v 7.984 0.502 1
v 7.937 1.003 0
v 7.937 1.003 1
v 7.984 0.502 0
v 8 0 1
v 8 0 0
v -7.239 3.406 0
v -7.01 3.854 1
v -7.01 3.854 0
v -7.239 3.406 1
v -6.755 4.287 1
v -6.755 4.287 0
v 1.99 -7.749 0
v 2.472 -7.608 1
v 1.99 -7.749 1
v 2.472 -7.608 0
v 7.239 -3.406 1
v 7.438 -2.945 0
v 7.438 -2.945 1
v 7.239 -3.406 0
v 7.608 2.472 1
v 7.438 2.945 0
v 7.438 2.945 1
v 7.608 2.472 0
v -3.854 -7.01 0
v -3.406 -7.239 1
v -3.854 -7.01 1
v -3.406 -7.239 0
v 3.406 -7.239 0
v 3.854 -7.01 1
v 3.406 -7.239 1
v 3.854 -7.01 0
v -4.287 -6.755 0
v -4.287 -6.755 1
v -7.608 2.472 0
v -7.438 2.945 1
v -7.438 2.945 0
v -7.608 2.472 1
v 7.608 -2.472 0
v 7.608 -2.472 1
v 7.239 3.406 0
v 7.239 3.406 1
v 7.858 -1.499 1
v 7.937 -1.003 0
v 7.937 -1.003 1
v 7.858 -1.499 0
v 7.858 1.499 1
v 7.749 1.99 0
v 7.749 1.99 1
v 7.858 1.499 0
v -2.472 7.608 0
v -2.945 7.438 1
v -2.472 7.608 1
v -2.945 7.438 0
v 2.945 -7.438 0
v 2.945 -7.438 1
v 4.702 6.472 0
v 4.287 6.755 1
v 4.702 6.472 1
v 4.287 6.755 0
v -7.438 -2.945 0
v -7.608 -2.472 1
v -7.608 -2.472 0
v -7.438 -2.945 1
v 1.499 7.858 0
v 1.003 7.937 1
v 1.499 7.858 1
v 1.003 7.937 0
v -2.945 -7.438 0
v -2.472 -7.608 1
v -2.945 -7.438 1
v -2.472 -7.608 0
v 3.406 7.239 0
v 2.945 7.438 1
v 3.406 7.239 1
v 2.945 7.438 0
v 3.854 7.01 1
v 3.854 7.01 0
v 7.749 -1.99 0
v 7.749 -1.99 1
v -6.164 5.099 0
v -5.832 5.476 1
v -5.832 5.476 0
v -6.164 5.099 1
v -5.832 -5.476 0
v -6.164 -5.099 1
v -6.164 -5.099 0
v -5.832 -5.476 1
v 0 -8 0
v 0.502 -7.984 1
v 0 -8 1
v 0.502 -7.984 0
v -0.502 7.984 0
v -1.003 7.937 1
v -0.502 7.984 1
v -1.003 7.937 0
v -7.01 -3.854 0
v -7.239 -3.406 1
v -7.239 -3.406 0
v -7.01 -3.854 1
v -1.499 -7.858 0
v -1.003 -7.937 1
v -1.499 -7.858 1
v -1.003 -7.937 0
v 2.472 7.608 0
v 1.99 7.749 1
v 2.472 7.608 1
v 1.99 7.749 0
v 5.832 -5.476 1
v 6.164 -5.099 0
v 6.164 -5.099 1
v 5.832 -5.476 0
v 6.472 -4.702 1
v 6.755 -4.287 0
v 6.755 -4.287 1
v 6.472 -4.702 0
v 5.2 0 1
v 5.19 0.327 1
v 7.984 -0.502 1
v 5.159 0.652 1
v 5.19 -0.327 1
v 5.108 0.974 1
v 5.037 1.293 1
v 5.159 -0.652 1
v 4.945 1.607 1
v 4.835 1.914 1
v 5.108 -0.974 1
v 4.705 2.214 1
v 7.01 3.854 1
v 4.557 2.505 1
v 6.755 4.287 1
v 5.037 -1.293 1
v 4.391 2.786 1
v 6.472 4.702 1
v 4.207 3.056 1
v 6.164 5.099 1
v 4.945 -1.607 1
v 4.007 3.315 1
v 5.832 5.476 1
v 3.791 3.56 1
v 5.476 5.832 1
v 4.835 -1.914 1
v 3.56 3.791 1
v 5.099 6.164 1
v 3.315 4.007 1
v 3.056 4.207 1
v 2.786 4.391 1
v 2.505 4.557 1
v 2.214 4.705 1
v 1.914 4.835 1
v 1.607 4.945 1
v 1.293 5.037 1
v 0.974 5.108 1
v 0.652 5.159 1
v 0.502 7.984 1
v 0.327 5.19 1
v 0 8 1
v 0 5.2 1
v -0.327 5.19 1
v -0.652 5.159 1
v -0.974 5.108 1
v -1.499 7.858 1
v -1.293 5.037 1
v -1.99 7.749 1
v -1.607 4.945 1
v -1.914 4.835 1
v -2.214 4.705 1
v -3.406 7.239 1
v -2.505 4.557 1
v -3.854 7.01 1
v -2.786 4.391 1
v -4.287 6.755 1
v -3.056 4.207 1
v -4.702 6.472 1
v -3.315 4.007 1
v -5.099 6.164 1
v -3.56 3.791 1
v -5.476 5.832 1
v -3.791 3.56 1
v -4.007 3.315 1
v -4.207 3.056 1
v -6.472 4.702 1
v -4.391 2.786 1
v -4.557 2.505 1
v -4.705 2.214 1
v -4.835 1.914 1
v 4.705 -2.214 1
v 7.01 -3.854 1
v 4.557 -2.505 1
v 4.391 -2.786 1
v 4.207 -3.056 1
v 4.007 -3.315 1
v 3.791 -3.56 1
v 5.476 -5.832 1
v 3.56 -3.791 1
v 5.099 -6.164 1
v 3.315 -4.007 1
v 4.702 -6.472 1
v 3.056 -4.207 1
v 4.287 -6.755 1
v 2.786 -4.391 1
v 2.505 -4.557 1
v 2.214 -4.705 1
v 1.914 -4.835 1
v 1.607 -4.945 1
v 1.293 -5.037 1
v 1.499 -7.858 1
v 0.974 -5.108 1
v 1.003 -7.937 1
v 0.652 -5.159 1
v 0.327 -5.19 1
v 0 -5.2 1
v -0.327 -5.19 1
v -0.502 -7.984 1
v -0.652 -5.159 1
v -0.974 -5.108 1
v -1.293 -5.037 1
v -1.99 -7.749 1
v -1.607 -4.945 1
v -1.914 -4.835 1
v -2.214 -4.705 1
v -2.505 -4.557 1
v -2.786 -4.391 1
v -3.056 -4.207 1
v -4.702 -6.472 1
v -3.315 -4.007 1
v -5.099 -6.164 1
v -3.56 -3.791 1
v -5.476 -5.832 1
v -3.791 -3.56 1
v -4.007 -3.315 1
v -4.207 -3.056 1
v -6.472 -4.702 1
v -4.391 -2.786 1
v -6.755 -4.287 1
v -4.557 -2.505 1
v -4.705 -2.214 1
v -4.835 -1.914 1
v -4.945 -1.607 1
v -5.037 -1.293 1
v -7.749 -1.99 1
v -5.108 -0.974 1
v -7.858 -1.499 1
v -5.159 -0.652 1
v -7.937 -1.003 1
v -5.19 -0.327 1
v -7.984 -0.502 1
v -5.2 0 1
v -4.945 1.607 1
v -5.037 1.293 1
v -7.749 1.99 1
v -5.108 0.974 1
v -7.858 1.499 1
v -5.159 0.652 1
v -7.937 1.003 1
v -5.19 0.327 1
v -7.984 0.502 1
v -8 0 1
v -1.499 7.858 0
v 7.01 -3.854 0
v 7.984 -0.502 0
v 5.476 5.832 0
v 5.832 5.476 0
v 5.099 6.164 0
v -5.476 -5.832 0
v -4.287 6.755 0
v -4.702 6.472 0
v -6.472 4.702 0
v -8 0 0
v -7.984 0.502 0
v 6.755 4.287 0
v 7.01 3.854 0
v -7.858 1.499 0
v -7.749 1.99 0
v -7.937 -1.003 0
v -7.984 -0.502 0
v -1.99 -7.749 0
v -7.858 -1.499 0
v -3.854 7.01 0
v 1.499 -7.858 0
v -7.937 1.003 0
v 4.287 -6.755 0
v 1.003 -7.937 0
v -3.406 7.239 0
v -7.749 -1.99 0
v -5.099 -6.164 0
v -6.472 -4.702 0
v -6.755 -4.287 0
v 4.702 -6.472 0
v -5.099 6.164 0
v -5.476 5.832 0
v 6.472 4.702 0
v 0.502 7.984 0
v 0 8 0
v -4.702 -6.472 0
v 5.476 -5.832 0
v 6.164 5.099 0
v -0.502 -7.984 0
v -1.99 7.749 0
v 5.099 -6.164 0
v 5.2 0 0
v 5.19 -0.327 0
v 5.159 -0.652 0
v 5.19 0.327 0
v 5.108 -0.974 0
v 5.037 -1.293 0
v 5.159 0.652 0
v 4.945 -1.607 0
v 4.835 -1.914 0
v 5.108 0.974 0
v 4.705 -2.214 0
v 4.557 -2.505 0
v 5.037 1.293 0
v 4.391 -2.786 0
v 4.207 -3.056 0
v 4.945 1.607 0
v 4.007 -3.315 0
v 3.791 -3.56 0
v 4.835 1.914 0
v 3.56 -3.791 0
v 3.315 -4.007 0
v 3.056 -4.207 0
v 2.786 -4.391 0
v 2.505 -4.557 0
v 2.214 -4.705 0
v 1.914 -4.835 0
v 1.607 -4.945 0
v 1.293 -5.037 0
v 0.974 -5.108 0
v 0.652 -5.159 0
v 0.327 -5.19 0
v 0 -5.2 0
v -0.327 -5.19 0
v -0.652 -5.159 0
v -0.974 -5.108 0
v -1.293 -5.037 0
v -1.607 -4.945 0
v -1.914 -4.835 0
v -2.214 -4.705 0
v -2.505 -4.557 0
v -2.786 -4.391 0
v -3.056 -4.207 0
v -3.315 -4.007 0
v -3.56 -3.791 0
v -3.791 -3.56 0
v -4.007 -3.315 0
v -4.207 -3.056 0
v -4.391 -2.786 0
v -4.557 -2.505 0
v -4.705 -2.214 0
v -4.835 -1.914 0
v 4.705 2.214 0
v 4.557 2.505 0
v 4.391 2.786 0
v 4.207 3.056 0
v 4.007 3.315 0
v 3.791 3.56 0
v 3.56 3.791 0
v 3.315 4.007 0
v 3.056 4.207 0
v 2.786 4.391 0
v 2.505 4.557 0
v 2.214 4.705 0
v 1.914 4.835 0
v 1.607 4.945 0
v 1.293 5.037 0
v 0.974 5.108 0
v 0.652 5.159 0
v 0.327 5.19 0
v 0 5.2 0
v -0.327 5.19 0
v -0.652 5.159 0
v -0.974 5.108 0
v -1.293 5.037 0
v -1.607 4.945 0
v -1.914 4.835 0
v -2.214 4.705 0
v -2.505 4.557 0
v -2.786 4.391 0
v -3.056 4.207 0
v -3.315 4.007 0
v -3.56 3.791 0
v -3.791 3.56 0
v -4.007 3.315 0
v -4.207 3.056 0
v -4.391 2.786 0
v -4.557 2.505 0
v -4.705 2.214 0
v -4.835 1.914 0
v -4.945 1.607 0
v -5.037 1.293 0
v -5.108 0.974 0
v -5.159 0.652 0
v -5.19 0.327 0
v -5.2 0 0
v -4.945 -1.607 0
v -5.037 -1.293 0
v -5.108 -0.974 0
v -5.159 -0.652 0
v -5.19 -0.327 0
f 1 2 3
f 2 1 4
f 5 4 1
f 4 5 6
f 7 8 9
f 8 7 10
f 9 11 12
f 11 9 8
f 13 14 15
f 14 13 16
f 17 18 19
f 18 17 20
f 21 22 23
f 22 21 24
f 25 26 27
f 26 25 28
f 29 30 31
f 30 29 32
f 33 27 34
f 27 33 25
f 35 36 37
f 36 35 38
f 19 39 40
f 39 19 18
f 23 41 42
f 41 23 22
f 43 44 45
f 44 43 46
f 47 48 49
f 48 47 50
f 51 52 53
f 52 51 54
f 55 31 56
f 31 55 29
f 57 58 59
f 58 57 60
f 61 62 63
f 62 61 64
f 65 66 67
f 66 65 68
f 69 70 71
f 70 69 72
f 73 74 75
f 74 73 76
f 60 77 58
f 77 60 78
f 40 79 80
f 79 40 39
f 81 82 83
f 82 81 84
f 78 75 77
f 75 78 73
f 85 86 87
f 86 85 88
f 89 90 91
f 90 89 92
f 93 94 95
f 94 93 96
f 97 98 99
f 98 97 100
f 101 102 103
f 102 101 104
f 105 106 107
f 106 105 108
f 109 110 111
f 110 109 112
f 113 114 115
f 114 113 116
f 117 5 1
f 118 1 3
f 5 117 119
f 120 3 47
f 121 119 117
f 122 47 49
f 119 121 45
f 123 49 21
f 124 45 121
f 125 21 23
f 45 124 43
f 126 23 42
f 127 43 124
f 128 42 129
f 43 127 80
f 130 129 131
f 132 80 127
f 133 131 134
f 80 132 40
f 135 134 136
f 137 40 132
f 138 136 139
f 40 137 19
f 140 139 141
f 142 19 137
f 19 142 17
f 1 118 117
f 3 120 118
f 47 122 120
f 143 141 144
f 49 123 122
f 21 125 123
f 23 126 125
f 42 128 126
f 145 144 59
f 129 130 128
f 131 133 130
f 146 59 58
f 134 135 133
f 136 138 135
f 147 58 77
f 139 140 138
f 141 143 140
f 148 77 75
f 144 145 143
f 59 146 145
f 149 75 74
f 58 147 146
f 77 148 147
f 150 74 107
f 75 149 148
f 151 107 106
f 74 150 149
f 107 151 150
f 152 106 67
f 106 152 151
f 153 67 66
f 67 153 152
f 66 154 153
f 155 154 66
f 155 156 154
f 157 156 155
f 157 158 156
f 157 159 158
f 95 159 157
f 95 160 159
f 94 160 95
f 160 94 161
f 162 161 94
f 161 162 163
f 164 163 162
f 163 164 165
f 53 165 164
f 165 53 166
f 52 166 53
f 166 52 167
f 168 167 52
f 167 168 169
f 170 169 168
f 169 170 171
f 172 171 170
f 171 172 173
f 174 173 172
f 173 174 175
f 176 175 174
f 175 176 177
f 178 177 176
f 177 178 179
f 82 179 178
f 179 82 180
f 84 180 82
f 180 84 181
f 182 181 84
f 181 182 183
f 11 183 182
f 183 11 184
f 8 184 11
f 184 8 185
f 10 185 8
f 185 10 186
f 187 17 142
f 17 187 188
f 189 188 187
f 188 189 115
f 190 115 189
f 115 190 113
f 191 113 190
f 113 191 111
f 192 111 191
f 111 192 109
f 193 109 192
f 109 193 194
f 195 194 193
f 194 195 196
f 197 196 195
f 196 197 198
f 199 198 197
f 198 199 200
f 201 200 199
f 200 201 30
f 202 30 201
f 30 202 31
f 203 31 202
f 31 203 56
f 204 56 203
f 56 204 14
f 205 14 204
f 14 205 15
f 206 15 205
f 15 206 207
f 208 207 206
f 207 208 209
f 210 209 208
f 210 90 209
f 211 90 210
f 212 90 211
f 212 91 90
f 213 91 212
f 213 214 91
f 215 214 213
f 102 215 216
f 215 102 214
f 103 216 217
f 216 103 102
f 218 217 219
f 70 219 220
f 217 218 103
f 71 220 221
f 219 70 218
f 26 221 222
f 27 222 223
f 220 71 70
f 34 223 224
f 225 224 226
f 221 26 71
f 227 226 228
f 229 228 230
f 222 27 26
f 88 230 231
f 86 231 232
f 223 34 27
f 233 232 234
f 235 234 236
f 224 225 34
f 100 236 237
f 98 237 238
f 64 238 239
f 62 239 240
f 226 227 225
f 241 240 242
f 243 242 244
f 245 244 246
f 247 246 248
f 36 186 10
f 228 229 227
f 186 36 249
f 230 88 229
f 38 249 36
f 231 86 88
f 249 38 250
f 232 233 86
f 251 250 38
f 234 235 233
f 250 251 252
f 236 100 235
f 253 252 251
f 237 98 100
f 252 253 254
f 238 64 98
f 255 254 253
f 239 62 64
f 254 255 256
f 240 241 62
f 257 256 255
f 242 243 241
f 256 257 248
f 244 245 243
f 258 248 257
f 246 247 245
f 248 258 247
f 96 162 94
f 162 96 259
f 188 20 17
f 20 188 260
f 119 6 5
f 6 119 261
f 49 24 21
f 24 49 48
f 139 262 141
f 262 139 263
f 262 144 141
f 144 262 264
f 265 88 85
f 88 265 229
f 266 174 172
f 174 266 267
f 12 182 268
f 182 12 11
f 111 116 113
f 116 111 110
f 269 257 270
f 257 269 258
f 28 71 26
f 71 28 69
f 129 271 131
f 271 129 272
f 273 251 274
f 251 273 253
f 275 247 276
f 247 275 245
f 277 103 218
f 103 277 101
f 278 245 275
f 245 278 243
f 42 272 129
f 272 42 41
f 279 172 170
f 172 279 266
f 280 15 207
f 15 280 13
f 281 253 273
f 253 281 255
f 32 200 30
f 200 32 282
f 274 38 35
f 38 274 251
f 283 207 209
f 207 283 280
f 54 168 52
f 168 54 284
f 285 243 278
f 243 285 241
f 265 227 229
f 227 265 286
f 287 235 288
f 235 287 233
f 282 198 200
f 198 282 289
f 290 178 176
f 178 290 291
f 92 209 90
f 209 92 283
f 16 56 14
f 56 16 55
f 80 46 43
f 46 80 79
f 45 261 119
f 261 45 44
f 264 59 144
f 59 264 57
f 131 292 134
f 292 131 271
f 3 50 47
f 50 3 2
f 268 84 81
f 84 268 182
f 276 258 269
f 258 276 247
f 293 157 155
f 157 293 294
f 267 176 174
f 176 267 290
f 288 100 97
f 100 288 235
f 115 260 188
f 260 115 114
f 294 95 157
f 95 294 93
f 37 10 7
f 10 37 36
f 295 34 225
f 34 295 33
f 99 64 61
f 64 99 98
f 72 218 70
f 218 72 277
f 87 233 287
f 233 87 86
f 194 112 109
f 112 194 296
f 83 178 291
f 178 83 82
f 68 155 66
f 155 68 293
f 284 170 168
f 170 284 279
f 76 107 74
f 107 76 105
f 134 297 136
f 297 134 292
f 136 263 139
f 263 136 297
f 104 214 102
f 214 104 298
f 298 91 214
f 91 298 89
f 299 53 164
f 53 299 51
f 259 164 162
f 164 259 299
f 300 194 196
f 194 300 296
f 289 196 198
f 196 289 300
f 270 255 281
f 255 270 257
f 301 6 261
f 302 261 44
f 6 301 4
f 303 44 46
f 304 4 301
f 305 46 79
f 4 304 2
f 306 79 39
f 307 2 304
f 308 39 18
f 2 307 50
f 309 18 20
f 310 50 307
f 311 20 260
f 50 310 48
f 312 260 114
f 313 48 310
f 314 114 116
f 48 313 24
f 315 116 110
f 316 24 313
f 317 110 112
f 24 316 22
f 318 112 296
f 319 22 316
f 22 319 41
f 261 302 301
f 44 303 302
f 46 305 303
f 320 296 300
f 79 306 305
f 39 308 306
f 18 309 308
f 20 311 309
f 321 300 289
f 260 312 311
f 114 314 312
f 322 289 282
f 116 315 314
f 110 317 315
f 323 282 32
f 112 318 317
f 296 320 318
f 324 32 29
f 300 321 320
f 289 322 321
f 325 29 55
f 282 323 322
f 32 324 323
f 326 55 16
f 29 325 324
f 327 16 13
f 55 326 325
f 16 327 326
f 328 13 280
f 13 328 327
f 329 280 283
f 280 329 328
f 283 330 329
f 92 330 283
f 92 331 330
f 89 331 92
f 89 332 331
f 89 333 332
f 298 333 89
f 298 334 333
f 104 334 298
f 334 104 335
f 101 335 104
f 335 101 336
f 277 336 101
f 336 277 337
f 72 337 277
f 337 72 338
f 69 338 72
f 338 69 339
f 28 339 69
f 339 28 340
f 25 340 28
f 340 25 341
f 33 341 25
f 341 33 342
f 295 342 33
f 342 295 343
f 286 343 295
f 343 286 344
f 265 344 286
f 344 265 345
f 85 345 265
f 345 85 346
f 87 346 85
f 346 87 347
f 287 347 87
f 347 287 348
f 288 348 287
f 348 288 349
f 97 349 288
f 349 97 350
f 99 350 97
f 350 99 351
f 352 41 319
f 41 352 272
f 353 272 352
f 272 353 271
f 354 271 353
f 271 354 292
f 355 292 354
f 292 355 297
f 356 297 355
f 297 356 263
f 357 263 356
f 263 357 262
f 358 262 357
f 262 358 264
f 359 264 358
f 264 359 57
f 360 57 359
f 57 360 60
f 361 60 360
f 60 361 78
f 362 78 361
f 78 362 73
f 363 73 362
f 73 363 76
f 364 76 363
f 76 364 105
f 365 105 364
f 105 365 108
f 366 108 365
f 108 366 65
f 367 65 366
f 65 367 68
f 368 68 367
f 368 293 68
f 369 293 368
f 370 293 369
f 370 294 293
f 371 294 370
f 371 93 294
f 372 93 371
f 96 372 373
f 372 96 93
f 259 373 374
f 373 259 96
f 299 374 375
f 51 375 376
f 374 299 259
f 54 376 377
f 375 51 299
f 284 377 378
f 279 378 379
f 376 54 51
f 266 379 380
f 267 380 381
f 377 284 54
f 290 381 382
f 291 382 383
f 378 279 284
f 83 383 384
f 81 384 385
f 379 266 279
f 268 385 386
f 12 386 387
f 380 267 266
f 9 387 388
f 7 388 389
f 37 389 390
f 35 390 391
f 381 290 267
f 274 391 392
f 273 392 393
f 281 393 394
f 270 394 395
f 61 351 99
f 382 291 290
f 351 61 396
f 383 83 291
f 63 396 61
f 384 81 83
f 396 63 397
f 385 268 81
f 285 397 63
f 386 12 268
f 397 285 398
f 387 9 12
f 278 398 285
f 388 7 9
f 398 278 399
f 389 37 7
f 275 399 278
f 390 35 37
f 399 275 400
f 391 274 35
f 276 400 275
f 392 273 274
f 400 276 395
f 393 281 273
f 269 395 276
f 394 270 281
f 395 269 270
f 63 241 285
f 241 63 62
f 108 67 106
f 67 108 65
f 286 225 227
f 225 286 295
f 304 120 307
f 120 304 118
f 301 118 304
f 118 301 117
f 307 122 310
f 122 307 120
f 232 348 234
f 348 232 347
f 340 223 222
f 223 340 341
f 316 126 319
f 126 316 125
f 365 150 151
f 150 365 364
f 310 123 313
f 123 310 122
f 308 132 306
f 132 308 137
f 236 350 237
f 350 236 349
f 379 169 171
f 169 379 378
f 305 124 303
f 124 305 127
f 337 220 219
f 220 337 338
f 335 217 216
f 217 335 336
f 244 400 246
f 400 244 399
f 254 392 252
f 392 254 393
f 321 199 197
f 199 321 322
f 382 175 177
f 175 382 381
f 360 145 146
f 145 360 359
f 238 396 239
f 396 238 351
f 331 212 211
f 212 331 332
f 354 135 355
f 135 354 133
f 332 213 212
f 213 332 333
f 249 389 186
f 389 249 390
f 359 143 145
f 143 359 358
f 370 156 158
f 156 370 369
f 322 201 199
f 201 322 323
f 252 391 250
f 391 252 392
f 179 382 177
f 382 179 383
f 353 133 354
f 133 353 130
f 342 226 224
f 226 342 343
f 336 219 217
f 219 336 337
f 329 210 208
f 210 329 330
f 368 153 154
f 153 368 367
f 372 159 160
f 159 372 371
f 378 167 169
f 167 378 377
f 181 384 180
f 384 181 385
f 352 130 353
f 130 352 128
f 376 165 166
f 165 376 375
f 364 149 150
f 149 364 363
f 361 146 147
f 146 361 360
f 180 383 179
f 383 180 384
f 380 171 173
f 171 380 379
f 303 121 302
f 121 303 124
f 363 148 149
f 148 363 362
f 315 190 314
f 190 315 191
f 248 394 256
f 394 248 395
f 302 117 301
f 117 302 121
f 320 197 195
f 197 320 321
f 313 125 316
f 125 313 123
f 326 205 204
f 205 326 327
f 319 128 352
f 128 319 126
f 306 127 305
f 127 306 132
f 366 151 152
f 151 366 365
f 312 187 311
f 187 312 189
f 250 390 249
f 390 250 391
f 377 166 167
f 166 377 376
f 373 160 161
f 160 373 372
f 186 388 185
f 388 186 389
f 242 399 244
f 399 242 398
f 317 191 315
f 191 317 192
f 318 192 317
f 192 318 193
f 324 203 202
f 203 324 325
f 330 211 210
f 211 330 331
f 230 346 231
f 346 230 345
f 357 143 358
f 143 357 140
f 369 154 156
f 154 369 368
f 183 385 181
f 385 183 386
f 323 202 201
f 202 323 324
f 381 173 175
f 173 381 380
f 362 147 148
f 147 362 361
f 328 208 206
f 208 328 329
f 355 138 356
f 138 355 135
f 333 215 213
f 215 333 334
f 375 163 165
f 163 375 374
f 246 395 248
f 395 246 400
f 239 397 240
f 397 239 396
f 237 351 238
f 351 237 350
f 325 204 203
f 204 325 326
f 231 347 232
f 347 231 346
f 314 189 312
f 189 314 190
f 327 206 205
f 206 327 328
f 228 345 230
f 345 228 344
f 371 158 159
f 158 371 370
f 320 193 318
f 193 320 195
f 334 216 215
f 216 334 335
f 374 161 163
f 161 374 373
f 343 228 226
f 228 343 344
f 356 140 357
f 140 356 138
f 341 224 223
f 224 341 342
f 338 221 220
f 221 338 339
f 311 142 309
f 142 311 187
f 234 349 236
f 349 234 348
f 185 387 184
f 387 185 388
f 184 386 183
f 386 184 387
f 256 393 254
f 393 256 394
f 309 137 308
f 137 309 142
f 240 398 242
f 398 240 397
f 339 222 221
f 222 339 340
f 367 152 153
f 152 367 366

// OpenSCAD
$fn = 100;
h_main = 12;
h_wall = 3;
screw_depth = 10;
screw_box = 39;
screw_d = 3.0;
screw_offset = 3; 

shaft_d = 4.0;

gearbox_h1=5.5;
gearbox_h2=15;
gearbox_d1=27.2;
gearbox_d2=38.2;

brackets_z_offset=1.5;
brackets_w=screw_box + 2 * 11;

use <MCAD/shapes.scad>

//screw offset
ofst = screw_box/2;
ofsz = h_main-screw_depth;

module screw() {
    translate([0,0,-h_main/2]) cylinder(h = h_main*3, r = screw_d/2);
}

module big_bearing_holder(add_height=2, add_d=0) {
    //bearing holder outer
    translate([0,0,-h_wall-1.5]) 
    cylinder(h=h_wall+add_height, r=(22+h_wall+add_d)/2);
}

module gearbox() {
difference() {
    h_gb = gearbox_h2 + gearbox_h1 + h_wall;
    union() {
        cylinder(h = h_gb, r = 44/2);
        cylinder(h = h_gb+1, r = 41/2);
        translate([0,0,h_gb/2]) roundedBox(width = screw_box, 
            height = screw_box, depth = h_gb, radius = h_wall);
        
        big_bearing_holder();
    }
    
    // gearbox inner wide
    translate([0,0,h_wall+gearbox_h1]) cylinder(h = 50, r = gearbox_d2/2);
    
    // screws & spacers
    screw_holder_space=2.5;
    screw_d_space=screw_d+5.5;
    screw_space = (gearbox_h2 + gearbox_h1) - screw_holder_space*2 - 1;
    translate([ofst-screw_offset,ofst-screw_offset,ofsz]) {
        screw();
        translate([1,1,screw_holder_space]) cylinder(h=screw_space, r=screw_d_space/2);
    }
    translate([ofst-screw_offset,screw_offset-ofst,ofsz]) {
        screw();
        translate([1,-1,screw_holder_space]) cylinder(h=screw_space, r=screw_d_space/2);
    }
    translate([screw_offset-ofst,ofst-screw_offset,ofsz]) {
        screw();
        translate([-1,1,screw_holder_space]) cylinder(h=screw_space, r=screw_d_space/2);
    }
    translate([screw_offset-ofst,screw_offset-ofst,ofsz]) {
        screw();
        translate([-1,-1,screw_holder_space]) cylinder(h=screw_space, r=screw_d_space/2);
    }
    
    
    //bearing
    translate([0,0,-h_wall-0.5]) cylinder(h = 50, r = 22.2/2);
    translate([0,0,-h_wall-3]) cylinder(h = 50, r = 10.2/2);
    
    // gearbox inner container
    translate([0,0,h_wall]) cylinder(h = 50, r = gearbox_d1/2);
    // gearbox connector
    translate([ofst-5/2,-5/2,h_gb]) cube(size = 5);
    translate([0,0,h_gb]) cylinder(h = 5, r = 39.1/2);
    
    //bootom wall difference
    translate([0,0,-0.1]) difference(){
        cylinder(h=brackets_z_offset+0.1,r=32);
        translate([0,0,brackets_z_offset/2]) 
            roundedBox(width = screw_box, height = screw_box, 
            depth = brackets_z_offset+0.1, radius = h_wall);
    }
}
}

//Top box
module topbox(z_offset=-22){
translate([0,0,z_offset]) {
    difference () {
    w = screw_box + 3;
    h = h_wall + h_main + 7;
    union () {
        //top wall
        translate([0,0,h_wall/2]) roundedBox(width = w, 
            height = w, depth = h_wall, radius = h_wall);
        //bottom wall
        translate([0,0,h-h_wall/2-0.75]) 
            roundedBox(width=w, height=w, depth=h_wall+1.5, radius=h_wall);
        //stand1
        //translate([ofst-screw_offset,ofst-screw_offset,h/2]) 
        //roundedBox(width = h_wall*3, 
        //    height = h_wall*3, depth = h, radius = h_wall);
        //wall1
        translate([ofst-screw_offset,0,h/2]) 
        roundedBox(width = h_wall*3, 
            height = w, depth = h, radius = h_wall);
        //wall2
        translate([screw_offset-ofst,0,h/2]) 
        roundedBox(width = h_wall*3, 
            height = w, depth = h, radius = h_wall);
        
        //bearing_h
        translate([0,0,-3.5]) cylinder(h = 5, r = 12);
        
        mirror([0,0,-1]) translate([0,0,z_offset]) brackets();
    }
    
    //srews
    translate([ofst-screw_offset,ofst-screw_offset,ofsz]) screw();
    translate([ofst-screw_offset,screw_offset-ofst,ofsz]) screw();
    translate([screw_offset-ofst,ofst-screw_offset,ofsz]) screw();
    translate([screw_offset-ofst,screw_offset-ofst,ofsz]) screw();
    
    // screw space
    outer_d=24; inner_d=15;
    screw_space=h - h_wall*2 - 1.5;
    translate([outer_d,0,h_wall]) difference() {
        cylinder(h=screw_space,r=outer_d);
        cylinder(h=screw_space,r=inner_d);
    }
    
    // inner circle
    translate ([0,0,h_wall+0.01]) difference() {
        cylinder(h = h-h_wall*2-1.5, r = 18);
        translate([outer_d,0,0]) cube([outer_d+5,50,h*2], center = true);
    }
    translate([0,0,-z_offset-h_main-2.5]) big_bearing_holder(17.5, 1);
    
    //top bearing
    translate([0,0,-2.5]) cylinder(h = 10, r = 13.2/2);
    translate([0,0,-5]) cylinder(h = 10, r = 8/2);
    
    //bootom wall difference
    translate([0,0,-z_offset-brackets_z_offset]) difference(){
        cylinder(h=brackets_z_offset+0.1,r=32);
        translate([0,0,brackets_z_offset/2]) 
            roundedBox(width = screw_box, height = screw_box, 
            depth = brackets_z_offset+0.1, radius = h_wall);
    }
    
    //asd
    translate([0,0,-z_offset]) cube([10,100,10], center=true);
    
    }
}
}

module shaft(distance = -18){
translate([0,0,distance]) difference() {
    hole_d = 12;
    h = 21;
    h2 = 6.5;
    union (){
        cylinder(h = h, r = 10/2-0.2);
        
        rh=9;
        ds=1.2;
        cylinder(h = 13, r = rh);
        
        fnn=25; sh=0.4; offs=0.5;
        cylinder(h=offs,r=rh+ds*3,$fn=fnn);
        translate ([0,0,offs]) cylinder(h=0.5,r=rh+ds*3,$fn=fnn);
        translate ([0,0,offs+0.5]) cylinder(h=0.5,r=rh+ds*2,$fn=fnn);
        translate ([0,0,offs+1]) cylinder(h=0.5,r=rh+ds,$fn=fnn);
        
        offs2=offs+1.5+2;
        translate ([0,0,offs2]) cylinder(h=sh,r=rh+ds,$fn=fnn);
        translate ([0,0,offs2+sh]) cylinder(h=sh,r=rh+ds*2,$fn=fnn);
        translate ([0,0,offs2+sh*2]) cylinder(h=sh,r=rh+ds*2,$fn=fnn);
        translate ([0,0,offs2+sh*3]) cylinder(h=sh,r=rh+ds,$fn=fnn);
        
        offs3=offs2+4;
        translate ([0,0,offs3]) cylinder(h=sh,r=rh+ds,$fn=fnn);
        translate ([0,0,offs3+sh]) cylinder(h=sh,r=rh+ds*2,$fn=fnn);
        translate ([0,0,offs3+sh*2]) cylinder(h=sh,r=rh+ds*2,$fn=fnn);
        translate ([0,0,offs3+sh*3]) cylinder(h=sh,r=rh+ds,$fn=fnn);

        offs4=offs3+4;
        translate ([0,0,offs4]) cylinder(h=0.5,r=rh+ds,$fn=fnn);
        translate ([0,0,offs4+0.5]) cylinder(h=0.5,r=rh+ds*2,$fn=fnn);
        translate ([0,0,offs4+1]) cylinder(h=0.5,r=rh+ds*3,$fn=fnn);
        
        //belt dbg
        //%translate ([0,0,0.5]) cylinder(h=12,r=13);
        
        translate([0,0,h]) intersection() {
            cylinder(h = h2, r = 7.9/2);
            cube([5.9,8,h2*2], center = true);
        }
    }
    
    translate([0,0,-5]) cylinder(h = 40, r = shaft_d/2);
}
}

module brackets() translate([0,0,brackets_z_offset]) {
color("olive") difference() {
    union() {
        translate([0,ofst-screw_offset,h_wall/2])
         roundedBox(width = brackets_w, 
         height = h_wall*3, depth = h_wall, radius = h_wall);
        translate([0,screw_offset-ofst,h_wall/2])
         roundedBox(width = brackets_w, 
         height = h_wall*3, depth = h_wall, radius = h_wall);
    }
    
    //inner srews
    translate([ofst-screw_offset,ofst-screw_offset,ofsz]) screw();
    translate([ofst-screw_offset,screw_offset-ofst,ofsz]) screw();
    translate([screw_offset-ofst,ofst-screw_offset,ofsz]) screw();
    translate([screw_offset-ofst,screw_offset-ofst,ofsz]) screw();
    
    //outer srews
    ofstb=brackets_w/2-screw_offset/2;
    translate([ofstb-screw_offset,ofst-screw_offset,ofsz]) screw();
    translate([ofstb-screw_offset,screw_offset-ofst,ofsz]) screw();
    translate([screw_offset-ofstb,ofst-screw_offset,ofsz]) screw();
    translate([screw_offset-ofstb,screw_offset-ofst,ofsz]) screw();
    
    //inner circle
    translate([0,0,-0.5]) cylinder(h=h_wall+1,r=screw_box/2);
}
}

module hwall(h_gb, w, h, offset) {
    translate([screw_box-0.15,0,10.72])
    rotate(a=60, v=[0,-1,0])
    cube([h_gb,w,h], center = true);
    
    translate([h_gb*2-h_wall-2,0,h_gb-h_wall*1.5])
    roundedBox(width=h_wall*4,height=w,//screw_box+offset*1.5,
    depth=h,radius=h_wall);
}       
module holder() {
    offset=6;
    h=brackets_z_offset*2;
    w=screw_box+offset*1.5+h_wall+1;
    difference() {
        union() {
            cube([brackets_w+offset,w,h], center = true);
            
            h_gb = gearbox_h2 + gearbox_h1 + h_wall*2;
            hwall(h_gb, w, h, offset);
            mirror([1,0,0]) hwall(h_gb, w, h, offset);
            
            dx=24.5;
            dy=h_gb/2 - h_wall + 0.75;
            translate([0,dx,dy]) 
            cube([brackets_w*1.5+1,h_wall,h_gb-1.5], center=true);
            translate([0,-dx,dy]) 
            cube([brackets_w*1.5+1,h_wall,h_gb-1.5], center=true);
        }

    
        //outer srews
        ofstb=brackets_w/2-screw_offset/2;
        translate([ofstb-screw_offset,ofst-screw_offset,ofsz]) screw();
        translate([ofstb-screw_offset,screw_offset-ofst,ofsz]) screw();
        translate([screw_offset-ofstb,ofst-screw_offset,ofsz]) screw();
        translate([screw_offset-ofstb,screw_offset-ofst,ofsz]) screw();
        
        //wall difference
        translate([45,0.25,3.8]) rotate(a=60, v=[0,-1,0])
        cube([30,w+1,14.5], center = true);
        mirror([1,0,0])
        translate([45,0.25,3.8]) rotate(a=60, v=[0,-1,0])
        cube([30,w+1,14.4], center = true);
        
        //screws
        dx=w-3;
        dy=ofst+1;
        translate([dx,dy,0]) screw();
        translate([dx,-dy,0]) screw();
        translate([-dx,dy,0]) screw();
        translate([-dx,-dy,0]) screw();
        
        //big_bearing_holder(17.5, 1);
        roundedBox(width = screw_box+0.5, height = screw_box+0.5, 
            depth = 5, radius = h_wall);
    }
}
    

module holder2() translate([0,0,25]) {
    difference() {
        union() {
            roundedBox(width = screw_box*2+30, height = screw_box+13+h_wall*2, 
            depth = h_wall, radius = h_wall);
            
            translate([-24,0,50]) rotate(a=90, v=[0,1,0])
            roundedBox(width = screw_box*2+30, height = screw_box+13+h_wall*2,
            depth = h_wall, radius = h_wall);
            translate([-24+h_wall,0,68]) rotate(a=90, v=[0,1,0])
            roundedBox(width = screw_box*2-6, height = screw_box+13+h_wall*2,
            depth = h_wall, radius = h_wall);
            translate([-22.3,0,30.2])
            rotate(a=30,v=[0,1,0]) 
            cube([h_wall,55,h_wall*2], center=true);
            
            translate([-23,26,1]) 
            rotate(a=90,v=[1,0,0])
            linear_extrude(height=h_wall*2, center=true)
            polygon([[0,100],[70,0],[0,0]]);
            
            mirror([0,1,0]) translate([-23,26,1]) 
            rotate(a=90,v=[1,0,0])
            linear_extrude(height=h_wall*2, center=true)
            polygon([[0,100],[70,0],[0,0]]);
        }
        translate([7,0,0]) roundedBox(width = screw_box*1.5, height = 45, 
        depth = h_wall+1, radius = h_wall);
        
        translate([0,0,-501.5]) cube([1000,1000,1000], center=true);
        
        //screws
        offset=6;
        w=screw_box+offset*1.5+h_wall+1;
        dx=w-3;
        dy=ofst+1;
        translate([dx,dy,0]) screw();
        translate([dx,-dy,0]) screw();
        translate([-dx,dy,0]) screw();
        translate([-dx,-dy,0]) screw();
    }
}

tooth_l=31.5;
tooth_w1=21;
tooth_w2=18;
tooth_h=13+h_wall;


module wheel_tooth() {
    dw=(tooth_w1-tooth_w2)/2;
    r=6;
    translate([-tooth_w1/2,0,0])
    linear_extrude(height=tooth_h)
    offset(r=r)
    polygon([[r,r],[dw+r,tooth_l-r],
    [dw+tooth_w2-r,tooth_l-r],[tooth_w1-r,r]]);
    
    //// равнобедренный треугольник \ закругление внутри
    //// a — длина равных боковых сторон
    //// b — длина основания
    //// h — высота к основанию
    //// R — радиус описанной окружности
    // orig angle=75
    cab=(180-90)/2; // (180-75)/2 | α
    hbc=37.5; // 75/2       | β/2
    // a = b / (2 cos α)
    b = 25;
    a = b / (2 * cos(cab));
    h = sqrt(4*(a^2) - (b^2))/2;
    //echo("a=",a," b=",b," h=",h," ==", asd  );
    linear_extrude(height=tooth_h)
    translate([-14.6,20.15,0])
    rotate(a=126,v=[0,0,1])
    offset(r=-5)
    polygon([[-20,0],[0,b/2],[h,b/2],[0,0]
    ,[h,-b/2],[0,-b/2] ]);
}
module wheel_tooths() {
    wheel_tooth();
    rotate(a=72,v=[0,0,1]) wheel_tooth();
    rotate(a=72*2,v=[0,0,1]) wheel_tooth();
    rotate(a=72*3,v=[0,0,1]) wheel_tooth();
    rotate(a=72*4,v=[0,0,1]) wheel_tooth();
}
module wheel_gear() {
    difference() {
        union(){
            cylinder(h = tooth_h, r = 34);
            
            rotate(a=90,v=[0,0,0])
            rotate_extrude()
            translate([33.75,0,0])
            polygon([
            [0,0],[4,0],[4,1],[0,2.5],[0,3.5]
            ,[3,4.5],[3,5],[0,6]
            ,[0,7.5],[3,8.5],[3,9],[0,10]
            ,[0,11.5],[4,13],[4,13.5],[0,15]
            ]);
        }
        translate([0,0,h_wall])
        wheel_tooths();
        
        translate([0,0,-1]) cylinder(h=tooth_h, r=14.2/2);
    }
}

module wheel_holder() {
    h1=30;
    l1=35;
    hw=5;
    difference() {
        union(){
            cylinder(h=h1, r = 8);
            
            translate([0,6,0])
            rotate([0,-90,0])
            linear_extrude(height=hw)
            polygon([[0,0],[h1,0],[0,l1]]);
            
            translate([-6,2.5,0])
            rotate([90,-90,0])
            linear_extrude(height=hw)
            polygon([[0,0],[h1,0],[0,l1]]);
            
            linear_extrude(height=h_wall)
            polygon([[0,0],[-l1,0],[0,l1]]);
        }
        translate([0,0,-0.5])cylinder(h=h1+1, r = 5.2);
    }
}


//gearbox();  brackets();
//holder();
//holder2();
//topbox();
//shaft();

//wheel_gear();
//wheel_holder();
difference() {
    h1=1;
    cylinder(h=h1, r = 8);
    translate([0,0,-0.5])cylinder(h=h1+1, r = 5.2);
    }

//distancer
//difference () { cylinder(h=2,r=37/2); translate([0,0,-1]) cylinder(h=10,r=32/2); }
